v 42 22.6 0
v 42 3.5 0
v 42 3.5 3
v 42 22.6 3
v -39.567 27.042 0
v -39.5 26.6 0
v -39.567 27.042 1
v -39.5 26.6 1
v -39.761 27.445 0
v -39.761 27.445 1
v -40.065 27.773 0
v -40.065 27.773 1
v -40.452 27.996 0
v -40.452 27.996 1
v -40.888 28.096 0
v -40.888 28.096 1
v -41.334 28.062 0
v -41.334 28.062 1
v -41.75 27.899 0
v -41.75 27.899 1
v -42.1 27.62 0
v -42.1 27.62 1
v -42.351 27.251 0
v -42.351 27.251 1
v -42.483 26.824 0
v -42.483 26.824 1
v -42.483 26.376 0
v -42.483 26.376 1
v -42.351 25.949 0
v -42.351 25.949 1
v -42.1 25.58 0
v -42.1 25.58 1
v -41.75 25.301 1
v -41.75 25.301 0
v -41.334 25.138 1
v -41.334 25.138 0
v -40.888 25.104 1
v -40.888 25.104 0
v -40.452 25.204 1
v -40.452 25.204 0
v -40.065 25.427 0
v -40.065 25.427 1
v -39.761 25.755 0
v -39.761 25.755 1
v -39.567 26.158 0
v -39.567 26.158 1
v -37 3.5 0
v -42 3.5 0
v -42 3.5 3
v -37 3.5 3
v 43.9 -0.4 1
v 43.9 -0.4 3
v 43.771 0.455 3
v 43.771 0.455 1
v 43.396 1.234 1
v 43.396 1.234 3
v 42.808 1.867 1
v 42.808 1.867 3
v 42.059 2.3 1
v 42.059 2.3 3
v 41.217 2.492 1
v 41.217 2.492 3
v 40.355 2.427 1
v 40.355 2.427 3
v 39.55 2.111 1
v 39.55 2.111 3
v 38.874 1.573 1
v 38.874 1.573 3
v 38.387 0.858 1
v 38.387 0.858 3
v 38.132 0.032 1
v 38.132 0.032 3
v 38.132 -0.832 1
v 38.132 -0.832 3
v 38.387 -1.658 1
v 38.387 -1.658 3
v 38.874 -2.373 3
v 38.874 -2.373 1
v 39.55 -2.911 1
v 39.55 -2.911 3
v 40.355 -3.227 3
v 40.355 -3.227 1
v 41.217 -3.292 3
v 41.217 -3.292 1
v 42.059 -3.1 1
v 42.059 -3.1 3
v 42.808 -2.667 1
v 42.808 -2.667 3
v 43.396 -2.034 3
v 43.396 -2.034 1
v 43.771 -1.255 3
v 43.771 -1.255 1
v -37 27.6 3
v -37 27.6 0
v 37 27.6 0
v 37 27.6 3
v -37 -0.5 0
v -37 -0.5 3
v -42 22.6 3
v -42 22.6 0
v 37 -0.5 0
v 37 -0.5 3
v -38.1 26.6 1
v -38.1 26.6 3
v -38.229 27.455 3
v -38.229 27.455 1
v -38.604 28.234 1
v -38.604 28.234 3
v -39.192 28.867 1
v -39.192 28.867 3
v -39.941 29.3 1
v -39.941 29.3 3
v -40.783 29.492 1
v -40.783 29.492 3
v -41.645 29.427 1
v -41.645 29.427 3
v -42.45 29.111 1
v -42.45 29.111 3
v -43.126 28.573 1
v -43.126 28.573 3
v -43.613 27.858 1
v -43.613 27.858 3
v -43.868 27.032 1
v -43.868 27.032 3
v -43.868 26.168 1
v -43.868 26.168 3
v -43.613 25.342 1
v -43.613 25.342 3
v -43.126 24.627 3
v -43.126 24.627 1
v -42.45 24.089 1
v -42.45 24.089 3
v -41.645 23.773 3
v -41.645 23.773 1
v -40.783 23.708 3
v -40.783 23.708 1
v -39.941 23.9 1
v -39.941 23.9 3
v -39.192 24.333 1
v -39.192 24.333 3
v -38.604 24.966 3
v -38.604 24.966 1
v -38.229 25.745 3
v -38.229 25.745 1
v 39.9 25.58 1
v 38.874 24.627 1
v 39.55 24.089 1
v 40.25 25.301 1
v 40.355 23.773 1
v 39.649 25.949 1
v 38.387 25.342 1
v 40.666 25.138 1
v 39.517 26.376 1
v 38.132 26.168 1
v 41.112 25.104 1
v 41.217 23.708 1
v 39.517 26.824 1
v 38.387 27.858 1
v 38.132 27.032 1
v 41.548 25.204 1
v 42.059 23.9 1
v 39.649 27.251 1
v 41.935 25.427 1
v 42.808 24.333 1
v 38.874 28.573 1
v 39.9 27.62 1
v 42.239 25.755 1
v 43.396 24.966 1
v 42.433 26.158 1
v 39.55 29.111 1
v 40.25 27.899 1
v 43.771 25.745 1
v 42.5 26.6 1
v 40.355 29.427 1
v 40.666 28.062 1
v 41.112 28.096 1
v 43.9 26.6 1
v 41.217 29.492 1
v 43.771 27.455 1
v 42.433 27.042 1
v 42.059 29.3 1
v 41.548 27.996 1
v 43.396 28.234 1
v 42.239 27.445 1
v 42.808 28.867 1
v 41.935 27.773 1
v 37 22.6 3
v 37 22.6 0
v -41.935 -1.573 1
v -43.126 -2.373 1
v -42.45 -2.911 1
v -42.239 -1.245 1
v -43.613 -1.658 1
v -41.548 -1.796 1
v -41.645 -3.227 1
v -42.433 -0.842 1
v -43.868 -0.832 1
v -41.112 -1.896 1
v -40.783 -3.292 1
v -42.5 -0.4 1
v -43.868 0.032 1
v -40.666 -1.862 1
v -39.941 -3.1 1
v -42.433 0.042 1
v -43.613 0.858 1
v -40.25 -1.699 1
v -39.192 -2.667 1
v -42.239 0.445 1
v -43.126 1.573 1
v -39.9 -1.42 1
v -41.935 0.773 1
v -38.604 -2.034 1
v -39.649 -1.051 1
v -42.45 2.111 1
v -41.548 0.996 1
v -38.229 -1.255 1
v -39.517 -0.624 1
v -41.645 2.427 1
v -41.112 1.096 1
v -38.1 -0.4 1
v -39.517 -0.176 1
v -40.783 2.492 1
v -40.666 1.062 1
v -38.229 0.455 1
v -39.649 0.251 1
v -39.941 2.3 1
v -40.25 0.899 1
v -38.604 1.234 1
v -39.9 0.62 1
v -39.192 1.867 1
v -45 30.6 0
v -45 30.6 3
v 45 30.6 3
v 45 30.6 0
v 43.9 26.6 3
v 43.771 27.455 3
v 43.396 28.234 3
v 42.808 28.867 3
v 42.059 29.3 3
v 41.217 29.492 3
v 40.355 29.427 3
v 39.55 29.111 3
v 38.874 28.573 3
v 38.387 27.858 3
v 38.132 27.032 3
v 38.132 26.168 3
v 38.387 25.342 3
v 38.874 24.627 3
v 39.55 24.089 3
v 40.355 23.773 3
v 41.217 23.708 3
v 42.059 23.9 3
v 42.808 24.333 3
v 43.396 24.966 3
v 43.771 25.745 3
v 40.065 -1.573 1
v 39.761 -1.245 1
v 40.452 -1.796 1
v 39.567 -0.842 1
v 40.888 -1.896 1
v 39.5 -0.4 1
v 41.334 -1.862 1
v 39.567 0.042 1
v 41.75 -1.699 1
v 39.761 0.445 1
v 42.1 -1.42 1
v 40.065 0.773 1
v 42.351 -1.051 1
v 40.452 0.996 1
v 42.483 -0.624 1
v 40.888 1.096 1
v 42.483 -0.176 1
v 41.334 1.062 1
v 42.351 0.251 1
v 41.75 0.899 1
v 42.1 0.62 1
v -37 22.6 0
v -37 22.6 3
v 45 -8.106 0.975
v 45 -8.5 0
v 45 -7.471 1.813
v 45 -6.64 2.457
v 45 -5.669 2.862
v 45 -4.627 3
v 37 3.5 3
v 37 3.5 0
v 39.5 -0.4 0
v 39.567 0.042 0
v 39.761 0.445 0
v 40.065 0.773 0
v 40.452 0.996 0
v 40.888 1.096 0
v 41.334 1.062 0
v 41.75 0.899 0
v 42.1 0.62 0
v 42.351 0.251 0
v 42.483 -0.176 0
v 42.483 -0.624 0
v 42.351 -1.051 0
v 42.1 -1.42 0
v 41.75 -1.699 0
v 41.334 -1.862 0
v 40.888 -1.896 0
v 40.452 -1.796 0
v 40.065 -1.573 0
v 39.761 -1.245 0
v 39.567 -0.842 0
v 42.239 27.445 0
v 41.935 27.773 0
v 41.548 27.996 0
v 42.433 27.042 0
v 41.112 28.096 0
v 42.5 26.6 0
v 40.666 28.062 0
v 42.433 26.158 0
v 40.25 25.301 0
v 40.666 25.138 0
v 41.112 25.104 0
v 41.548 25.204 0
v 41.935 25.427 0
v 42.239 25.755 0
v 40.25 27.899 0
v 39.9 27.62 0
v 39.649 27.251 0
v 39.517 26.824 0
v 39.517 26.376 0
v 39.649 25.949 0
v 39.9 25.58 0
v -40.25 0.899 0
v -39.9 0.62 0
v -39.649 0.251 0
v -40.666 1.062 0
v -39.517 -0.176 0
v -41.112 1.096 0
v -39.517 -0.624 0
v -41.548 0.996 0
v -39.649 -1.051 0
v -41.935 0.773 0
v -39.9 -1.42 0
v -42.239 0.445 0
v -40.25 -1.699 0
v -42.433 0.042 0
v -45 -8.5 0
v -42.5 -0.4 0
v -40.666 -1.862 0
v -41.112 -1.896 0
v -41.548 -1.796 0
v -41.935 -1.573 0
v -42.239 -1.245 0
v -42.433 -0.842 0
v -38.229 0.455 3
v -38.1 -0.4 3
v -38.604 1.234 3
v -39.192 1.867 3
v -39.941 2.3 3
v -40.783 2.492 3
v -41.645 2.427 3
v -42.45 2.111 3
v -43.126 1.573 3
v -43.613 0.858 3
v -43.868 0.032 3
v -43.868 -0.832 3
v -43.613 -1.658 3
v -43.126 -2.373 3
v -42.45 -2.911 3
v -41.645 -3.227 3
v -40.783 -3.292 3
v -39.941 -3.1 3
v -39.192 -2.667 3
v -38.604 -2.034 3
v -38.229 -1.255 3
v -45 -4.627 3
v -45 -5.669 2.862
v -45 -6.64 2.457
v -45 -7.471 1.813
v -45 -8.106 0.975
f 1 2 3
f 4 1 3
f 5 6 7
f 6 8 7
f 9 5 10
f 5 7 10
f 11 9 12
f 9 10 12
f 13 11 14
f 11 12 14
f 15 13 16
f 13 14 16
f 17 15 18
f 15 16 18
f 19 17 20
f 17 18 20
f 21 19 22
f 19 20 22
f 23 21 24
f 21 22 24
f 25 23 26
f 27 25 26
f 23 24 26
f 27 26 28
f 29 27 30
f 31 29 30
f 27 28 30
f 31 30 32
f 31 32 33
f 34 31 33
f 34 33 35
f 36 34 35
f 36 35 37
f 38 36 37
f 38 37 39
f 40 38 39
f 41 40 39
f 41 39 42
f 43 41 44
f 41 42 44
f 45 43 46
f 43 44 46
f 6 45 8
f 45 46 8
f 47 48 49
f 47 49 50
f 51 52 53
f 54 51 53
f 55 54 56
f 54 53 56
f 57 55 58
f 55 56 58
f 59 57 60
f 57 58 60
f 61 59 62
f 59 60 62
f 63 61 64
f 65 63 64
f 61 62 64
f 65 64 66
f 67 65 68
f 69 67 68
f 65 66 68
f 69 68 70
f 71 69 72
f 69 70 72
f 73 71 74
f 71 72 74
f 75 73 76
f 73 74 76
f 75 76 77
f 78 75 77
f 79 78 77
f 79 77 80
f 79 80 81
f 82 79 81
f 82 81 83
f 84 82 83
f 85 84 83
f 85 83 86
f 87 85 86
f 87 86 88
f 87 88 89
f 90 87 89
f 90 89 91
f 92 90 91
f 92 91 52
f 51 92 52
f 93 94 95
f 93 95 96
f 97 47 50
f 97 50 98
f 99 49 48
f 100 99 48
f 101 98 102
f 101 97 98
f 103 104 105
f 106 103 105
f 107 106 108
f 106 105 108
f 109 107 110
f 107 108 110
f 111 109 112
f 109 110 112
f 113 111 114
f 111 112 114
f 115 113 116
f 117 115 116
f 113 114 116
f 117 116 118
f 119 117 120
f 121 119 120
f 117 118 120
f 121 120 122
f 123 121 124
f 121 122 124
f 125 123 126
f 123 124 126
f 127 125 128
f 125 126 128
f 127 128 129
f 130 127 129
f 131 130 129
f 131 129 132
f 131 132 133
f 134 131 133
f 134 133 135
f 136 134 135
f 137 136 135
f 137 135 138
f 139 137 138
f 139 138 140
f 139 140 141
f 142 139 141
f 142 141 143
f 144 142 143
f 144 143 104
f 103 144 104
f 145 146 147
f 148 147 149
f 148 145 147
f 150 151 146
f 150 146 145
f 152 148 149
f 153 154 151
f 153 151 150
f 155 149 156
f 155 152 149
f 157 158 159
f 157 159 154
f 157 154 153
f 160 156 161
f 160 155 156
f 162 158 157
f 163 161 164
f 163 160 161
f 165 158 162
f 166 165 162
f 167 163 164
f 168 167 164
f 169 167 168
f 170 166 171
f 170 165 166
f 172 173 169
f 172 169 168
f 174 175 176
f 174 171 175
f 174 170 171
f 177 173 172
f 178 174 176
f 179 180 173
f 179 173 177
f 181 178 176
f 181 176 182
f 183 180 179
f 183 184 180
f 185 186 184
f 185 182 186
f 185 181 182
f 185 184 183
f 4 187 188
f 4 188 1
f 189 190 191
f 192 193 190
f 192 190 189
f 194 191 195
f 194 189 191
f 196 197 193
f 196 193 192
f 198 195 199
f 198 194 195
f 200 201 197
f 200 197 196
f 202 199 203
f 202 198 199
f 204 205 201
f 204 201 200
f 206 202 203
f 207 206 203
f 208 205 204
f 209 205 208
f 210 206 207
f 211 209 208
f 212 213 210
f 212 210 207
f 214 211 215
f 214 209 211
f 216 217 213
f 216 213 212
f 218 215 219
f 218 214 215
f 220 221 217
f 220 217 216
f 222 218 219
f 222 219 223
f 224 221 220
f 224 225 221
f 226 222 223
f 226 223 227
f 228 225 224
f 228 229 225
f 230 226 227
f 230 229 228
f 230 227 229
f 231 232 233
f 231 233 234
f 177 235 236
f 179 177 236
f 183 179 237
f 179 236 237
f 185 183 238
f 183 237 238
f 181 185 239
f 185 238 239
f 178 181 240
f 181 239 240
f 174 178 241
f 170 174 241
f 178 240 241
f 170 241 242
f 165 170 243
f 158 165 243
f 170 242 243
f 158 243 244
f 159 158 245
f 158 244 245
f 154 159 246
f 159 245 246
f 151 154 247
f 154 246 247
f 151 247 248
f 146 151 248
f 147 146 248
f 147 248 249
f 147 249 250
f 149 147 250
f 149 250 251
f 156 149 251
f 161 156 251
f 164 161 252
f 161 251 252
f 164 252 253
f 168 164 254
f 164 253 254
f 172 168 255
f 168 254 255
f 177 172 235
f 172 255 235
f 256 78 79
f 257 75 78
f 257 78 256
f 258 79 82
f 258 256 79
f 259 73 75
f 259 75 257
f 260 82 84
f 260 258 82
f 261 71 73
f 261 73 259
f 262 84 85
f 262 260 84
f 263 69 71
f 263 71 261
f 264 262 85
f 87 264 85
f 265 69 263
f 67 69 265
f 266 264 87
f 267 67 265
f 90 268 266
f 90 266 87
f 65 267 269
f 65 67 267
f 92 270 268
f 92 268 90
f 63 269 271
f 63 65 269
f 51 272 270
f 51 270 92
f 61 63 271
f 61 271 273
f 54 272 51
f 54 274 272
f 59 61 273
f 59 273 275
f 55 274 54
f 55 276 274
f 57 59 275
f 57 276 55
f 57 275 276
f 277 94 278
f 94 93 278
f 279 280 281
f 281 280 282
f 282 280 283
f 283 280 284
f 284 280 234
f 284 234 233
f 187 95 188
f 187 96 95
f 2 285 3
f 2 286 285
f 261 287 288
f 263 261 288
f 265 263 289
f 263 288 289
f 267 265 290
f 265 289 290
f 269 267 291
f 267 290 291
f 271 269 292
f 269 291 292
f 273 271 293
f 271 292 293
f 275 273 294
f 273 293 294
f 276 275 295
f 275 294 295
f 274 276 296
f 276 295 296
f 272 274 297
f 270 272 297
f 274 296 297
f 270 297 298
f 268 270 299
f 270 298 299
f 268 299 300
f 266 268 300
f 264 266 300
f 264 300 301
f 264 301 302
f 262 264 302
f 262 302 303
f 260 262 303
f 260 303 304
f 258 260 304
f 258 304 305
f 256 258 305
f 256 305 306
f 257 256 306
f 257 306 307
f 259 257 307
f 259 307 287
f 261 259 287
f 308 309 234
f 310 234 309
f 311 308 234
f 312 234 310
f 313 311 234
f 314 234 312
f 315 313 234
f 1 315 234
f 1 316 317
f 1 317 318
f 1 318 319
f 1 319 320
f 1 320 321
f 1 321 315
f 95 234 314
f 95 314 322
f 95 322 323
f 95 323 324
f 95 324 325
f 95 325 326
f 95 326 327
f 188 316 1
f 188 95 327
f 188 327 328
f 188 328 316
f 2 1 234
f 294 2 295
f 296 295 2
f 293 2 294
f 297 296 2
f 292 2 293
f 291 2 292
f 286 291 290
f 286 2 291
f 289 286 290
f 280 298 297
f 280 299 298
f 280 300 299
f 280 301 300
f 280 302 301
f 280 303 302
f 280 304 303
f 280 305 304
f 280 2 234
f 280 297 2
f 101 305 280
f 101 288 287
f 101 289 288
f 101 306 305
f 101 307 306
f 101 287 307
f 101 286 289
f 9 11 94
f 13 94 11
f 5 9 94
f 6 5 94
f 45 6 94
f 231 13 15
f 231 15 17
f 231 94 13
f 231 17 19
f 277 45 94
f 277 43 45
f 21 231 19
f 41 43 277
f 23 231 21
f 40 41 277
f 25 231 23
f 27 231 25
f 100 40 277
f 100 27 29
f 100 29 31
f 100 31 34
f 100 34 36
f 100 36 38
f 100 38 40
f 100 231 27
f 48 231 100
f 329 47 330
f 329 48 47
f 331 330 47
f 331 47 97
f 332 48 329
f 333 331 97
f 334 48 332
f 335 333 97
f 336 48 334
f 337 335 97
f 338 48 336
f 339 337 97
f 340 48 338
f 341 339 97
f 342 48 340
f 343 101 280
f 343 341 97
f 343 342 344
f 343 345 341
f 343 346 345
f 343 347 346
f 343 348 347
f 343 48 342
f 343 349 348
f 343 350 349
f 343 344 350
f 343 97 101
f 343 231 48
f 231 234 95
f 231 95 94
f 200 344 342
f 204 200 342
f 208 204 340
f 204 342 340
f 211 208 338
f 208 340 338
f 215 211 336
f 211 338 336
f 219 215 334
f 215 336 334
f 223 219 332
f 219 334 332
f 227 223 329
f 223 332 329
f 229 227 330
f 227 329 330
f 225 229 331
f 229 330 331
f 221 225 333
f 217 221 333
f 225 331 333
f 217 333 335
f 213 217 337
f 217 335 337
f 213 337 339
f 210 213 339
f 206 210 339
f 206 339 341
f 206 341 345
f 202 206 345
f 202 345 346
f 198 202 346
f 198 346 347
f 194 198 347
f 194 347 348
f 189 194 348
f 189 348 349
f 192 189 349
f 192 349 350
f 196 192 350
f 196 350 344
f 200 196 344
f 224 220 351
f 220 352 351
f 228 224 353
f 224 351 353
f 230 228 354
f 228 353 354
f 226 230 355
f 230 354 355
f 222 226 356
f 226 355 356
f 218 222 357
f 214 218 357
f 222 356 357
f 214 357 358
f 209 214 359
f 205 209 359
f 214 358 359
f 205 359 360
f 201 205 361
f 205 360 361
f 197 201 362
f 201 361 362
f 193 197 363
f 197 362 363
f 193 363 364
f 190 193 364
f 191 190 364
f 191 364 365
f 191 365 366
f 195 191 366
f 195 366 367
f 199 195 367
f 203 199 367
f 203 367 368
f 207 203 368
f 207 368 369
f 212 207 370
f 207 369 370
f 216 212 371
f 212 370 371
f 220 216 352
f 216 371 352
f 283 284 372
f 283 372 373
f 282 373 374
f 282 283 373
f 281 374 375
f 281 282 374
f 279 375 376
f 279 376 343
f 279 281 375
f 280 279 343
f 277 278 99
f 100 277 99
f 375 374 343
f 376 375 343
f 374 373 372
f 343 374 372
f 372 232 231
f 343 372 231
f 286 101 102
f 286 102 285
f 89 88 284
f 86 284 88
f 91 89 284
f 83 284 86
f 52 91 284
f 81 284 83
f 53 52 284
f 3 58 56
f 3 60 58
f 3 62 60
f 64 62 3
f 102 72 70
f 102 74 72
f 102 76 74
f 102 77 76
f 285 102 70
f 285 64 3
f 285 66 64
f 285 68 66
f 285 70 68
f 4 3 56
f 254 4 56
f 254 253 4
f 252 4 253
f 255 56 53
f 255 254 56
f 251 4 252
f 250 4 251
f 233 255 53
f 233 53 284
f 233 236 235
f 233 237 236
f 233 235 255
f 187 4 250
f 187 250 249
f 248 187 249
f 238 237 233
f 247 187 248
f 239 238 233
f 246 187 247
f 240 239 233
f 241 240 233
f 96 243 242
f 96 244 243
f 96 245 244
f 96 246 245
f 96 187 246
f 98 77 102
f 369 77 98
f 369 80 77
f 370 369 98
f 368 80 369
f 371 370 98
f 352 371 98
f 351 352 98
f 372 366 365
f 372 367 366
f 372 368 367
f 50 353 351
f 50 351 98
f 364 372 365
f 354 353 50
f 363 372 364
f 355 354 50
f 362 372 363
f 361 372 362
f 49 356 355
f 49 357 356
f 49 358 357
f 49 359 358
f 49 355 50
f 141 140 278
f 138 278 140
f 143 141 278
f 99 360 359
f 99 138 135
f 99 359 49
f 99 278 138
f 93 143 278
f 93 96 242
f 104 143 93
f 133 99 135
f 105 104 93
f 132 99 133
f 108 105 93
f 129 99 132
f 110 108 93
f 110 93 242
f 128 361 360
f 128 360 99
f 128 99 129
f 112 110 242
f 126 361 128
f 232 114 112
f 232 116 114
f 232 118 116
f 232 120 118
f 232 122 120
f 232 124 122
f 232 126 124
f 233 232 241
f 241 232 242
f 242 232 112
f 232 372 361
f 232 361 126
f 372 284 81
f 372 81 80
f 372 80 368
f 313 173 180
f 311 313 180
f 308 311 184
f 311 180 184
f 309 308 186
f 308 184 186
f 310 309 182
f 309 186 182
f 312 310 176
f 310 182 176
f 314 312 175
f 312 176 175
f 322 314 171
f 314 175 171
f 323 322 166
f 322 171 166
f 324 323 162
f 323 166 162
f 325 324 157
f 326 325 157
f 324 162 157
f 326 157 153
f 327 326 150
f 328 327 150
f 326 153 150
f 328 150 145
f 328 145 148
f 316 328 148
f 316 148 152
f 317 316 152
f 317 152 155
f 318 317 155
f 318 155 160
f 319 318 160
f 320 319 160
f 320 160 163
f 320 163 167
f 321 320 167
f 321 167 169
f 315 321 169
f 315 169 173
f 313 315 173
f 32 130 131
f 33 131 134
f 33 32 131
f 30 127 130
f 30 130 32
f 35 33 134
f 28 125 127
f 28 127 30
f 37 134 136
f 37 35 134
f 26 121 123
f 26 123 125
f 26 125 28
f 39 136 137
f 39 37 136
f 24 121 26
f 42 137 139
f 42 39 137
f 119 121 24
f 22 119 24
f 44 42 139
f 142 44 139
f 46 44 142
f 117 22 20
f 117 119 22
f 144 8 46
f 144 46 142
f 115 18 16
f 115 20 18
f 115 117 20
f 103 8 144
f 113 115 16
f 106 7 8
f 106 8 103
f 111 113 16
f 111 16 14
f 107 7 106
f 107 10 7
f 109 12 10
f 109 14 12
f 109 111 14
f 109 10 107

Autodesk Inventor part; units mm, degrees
ref_plane "YZ Plane" through (0, 0, 0) normal (1, 0, 0) x (0, 1, 0)
ref_plane "XZ Plane" through (0, 0, 0) normal (0, 1, 0) x (-1, 0, 0)
ref_plane "XY Plane" through (0, 0, 0) normal (0, 0, 1) x (1, 0, 0)
sketch "スケッチ1" plane through (0, 0, 0) normal (0, 0, 1) x (1, 0, 0)
  line L0 (-45, 3.5) -> (45, 3.5)
  line L1 (45, 3.5) -> (45, -3.5)
  line L2 (45, -3.5) -> (-45, -3.5)
  line L3 (-45, -3.5) -> (-45, 3.5)
  line L4 (-45, 3.5) -> (45, -3.5) construction
  line L5 (45, 3.5) -> (-45, -3.5) construction
  point P0 (0, 0)
  dimension "d0" = 90
  dimension "d1" = 7
extrude "押し出し1" add sketch "スケッチ1" along normal blind 3
sketch "スケッチ2" plane through (0, 0, 3) normal (0, 0, 1) x (1, 0, 0)
  circle A0 centre (-41, -0.4) radius 2.9
  circle A1 centre (41, -0.4) radius 2.9
  line L0 (45, 3.5) -> (-45, 3.5) projected
  line L1 (45, -3.5) -> (45, 3.5) projected
  point P0 (0, 0)
  dimension "d4" = 5.8
  dimension "d5" = 5.8
  dimension "d7" = 3.9
  dimension "d8" = 3.9
  dimension "d9" = 82
  dimension "d10" = 4
extrude "押し出し2" cut sketch "スケッチ2" against normal blind 2
sketch "スケッチ3" plane through (0, 0, 0) normal (0, 0, -1) x (-1, 0, 0)
  circle A0 centre (41, -0.4) radius 1.5
  circle A1 centre (-41, -0.4) radius 1.5
  line L0 (45, -3.5) -> (45, 3.5) projected
  line L1 (-45, 3.5) -> (-45, -3.5) projected
  line L2 (45, 3.5) -> (-45, 3.5) projected
  point P0 (0, 0)
  dimension "d13" = 3
  dimension "d14" = 3
  dimension "d15" = 4
  dimension "d16" = 4
  dimension "d17" = 3.9
  dimension "d18" = 3.9
extrude "押し出し3" cut sketch "スケッチ3" against normal blind 2
sketch "スケッチ4" plane through (-45, -3.5, 0) normal (0, -1, 0) x (1, 0, 0)
  line L0 (0, 0) -> (90, 0)
  line L1 (90, 0) -> (90, 3)
  line L2 (90, 3) -> (0, 3)
  line L3 (0, 3) -> (0, 0)
  point P0 (45, 0)
extrude "押し出し4" add sketch "スケッチ4" along normal blind 5
fillet "フィレット1" radius 4 1 edges at (0, -8.5, 3)
sketch "スケッチ6" plane through (0, 0, 0) normal (0, 0, -1) x (-1, 0, 0)
  line L0 (37, -0.5) -> (-37, -0.5)
  line L1 (-37, -0.5) -> (-37, 3.5)
  line L2 (-37, 3.5) -> (37, 3.5)
  line L3 (37, 3.5) -> (37, -0.5)
  line L4 (45, -8.5) -> (45, 3.5) projected
  line L5 (45, 3.5) -> (-45, 3.5) projected
  point P0 (0, 0)
  dimension "d24" = 74
  dimension "d25" = 8
  dimension "d26" = 0
  dimension "d27" = 4
extrude "押し出し5" cut sketch "スケッチ6" against normal blind 10
sketch "スケッチ7" plane through (45, 3.5, 3) normal (0, 1, 0) x (1, 0, 0)
  line L0 (0, 3) -> (-3, 3)
  line L1 (-3, 3) -> (-3, 0)
  line L2 (-3, 0) -> (0, 0)
  line L3 (0, 0) -> (0, 3)
  line L4 (-90, 0) -> (-87, 0)
  line L5 (-87, 0) -> (-87, 3)
  line L6 (-87, 3) -> (-90, 3)
  line L7 (-90, 3) -> (-90, 0)
  point P0 (-45, 3)
  dimension "d30" = 3
  dimension "d31" = 3
  dimension "d32" = 3
  dimension "d33" = 3
extrude "押し出し6" add sketch "スケッチ7" along normal blind 27.1
sketch "スケッチ8" plane through (-42, 3.5, 3) normal (1, 0, 0) x (0, 0, -1)
  line L0 (0, 27.1) -> (3, 27.1)
  line L1 (3, 27.1) -> (3, 24.1)
  line L2 (3, 24.1) -> (0, 24.1)
  line L3 (0, 24.1) -> (0, 27.1)
  point P0 (3, -3.5)
  dimension "d36" = 3
  dimension "d37" = 3
extrude "押し出し7" add sketch "スケッチ8" along normal blind 86
sketch "スケッチ9" plane through (0, 0, 3) normal (0, 0, 1) x (1, 0, 0)
  line L0 (-45, 30.6) -> (-37, 30.6)
  line L1 (-37, 30.6) -> (-37, 22.6)
  line L2 (-37, 22.6) -> (-45, 22.6)
  line L3 (-45, 22.6) -> (-45, 30.6)
  line L4 (45, 30.6) -> (37, 30.6)
  line L5 (37, 30.6) -> (37, 22.6)
  line L6 (37, 22.6) -> (45, 22.6)
  line L7 (45, 22.6) -> (45, 30.6)
  point P0 (0, 0)
  dimension "d40" = 8
  dimension "d41" = 8
  dimension "d42" = 8
  dimension "d43" = 8
extrude "押し出し8" add sketch "スケッチ9" against normal blind 3
sketch "スケッチ10" plane through (0, 0, 3) normal (0, 0, 1) x (1, 0, 0)
  circle A0 centre (-41, 26.6) radius 1.5
  circle A1 centre (41, 26.6) radius 1.5
  line L0 (-45, 30.6) -> (45, 30.6) projected
  line L1 (-45, -4.627) -> (-45, 30.6) projected
  line L2 (45, 30.6) -> (45, -4.627) projected
  point P0 (0, 0)
  dimension "d46" = 4
  dimension "d47" = 4
  dimension "d50" = 3
  dimension "d51" = 3
  dimension "d52" = 4
  dimension "d53" = 4
extrude "押し出し9" cut sketch "スケッチ10" against normal blind 3
sketch "スケッチ11" plane through (0, 0, 3) normal (0, 0, 1) x (1, 0, 0)
  circle A0 centre (-41, 26.6) radius 1.5 projected
  circle A1 centre (-41, 26.6) radius 2.9
  circle A2 centre (41, 26.6) radius 2.9
  line L0 (-45, 30.6) -> (45, 30.6) projected
  line L1 (45, 30.6) -> (45, -4.627) projected
  point P0 (0, 0)
  dimension "d56" = 5.8
  dimension "d57" = 5.8
  dimension "d58" = 4
  dimension "d60" = 4
extrude "押し出し10" cut sketch "スケッチ11" against normal blind 2
properties part number "LineTraceCoverFlont"
